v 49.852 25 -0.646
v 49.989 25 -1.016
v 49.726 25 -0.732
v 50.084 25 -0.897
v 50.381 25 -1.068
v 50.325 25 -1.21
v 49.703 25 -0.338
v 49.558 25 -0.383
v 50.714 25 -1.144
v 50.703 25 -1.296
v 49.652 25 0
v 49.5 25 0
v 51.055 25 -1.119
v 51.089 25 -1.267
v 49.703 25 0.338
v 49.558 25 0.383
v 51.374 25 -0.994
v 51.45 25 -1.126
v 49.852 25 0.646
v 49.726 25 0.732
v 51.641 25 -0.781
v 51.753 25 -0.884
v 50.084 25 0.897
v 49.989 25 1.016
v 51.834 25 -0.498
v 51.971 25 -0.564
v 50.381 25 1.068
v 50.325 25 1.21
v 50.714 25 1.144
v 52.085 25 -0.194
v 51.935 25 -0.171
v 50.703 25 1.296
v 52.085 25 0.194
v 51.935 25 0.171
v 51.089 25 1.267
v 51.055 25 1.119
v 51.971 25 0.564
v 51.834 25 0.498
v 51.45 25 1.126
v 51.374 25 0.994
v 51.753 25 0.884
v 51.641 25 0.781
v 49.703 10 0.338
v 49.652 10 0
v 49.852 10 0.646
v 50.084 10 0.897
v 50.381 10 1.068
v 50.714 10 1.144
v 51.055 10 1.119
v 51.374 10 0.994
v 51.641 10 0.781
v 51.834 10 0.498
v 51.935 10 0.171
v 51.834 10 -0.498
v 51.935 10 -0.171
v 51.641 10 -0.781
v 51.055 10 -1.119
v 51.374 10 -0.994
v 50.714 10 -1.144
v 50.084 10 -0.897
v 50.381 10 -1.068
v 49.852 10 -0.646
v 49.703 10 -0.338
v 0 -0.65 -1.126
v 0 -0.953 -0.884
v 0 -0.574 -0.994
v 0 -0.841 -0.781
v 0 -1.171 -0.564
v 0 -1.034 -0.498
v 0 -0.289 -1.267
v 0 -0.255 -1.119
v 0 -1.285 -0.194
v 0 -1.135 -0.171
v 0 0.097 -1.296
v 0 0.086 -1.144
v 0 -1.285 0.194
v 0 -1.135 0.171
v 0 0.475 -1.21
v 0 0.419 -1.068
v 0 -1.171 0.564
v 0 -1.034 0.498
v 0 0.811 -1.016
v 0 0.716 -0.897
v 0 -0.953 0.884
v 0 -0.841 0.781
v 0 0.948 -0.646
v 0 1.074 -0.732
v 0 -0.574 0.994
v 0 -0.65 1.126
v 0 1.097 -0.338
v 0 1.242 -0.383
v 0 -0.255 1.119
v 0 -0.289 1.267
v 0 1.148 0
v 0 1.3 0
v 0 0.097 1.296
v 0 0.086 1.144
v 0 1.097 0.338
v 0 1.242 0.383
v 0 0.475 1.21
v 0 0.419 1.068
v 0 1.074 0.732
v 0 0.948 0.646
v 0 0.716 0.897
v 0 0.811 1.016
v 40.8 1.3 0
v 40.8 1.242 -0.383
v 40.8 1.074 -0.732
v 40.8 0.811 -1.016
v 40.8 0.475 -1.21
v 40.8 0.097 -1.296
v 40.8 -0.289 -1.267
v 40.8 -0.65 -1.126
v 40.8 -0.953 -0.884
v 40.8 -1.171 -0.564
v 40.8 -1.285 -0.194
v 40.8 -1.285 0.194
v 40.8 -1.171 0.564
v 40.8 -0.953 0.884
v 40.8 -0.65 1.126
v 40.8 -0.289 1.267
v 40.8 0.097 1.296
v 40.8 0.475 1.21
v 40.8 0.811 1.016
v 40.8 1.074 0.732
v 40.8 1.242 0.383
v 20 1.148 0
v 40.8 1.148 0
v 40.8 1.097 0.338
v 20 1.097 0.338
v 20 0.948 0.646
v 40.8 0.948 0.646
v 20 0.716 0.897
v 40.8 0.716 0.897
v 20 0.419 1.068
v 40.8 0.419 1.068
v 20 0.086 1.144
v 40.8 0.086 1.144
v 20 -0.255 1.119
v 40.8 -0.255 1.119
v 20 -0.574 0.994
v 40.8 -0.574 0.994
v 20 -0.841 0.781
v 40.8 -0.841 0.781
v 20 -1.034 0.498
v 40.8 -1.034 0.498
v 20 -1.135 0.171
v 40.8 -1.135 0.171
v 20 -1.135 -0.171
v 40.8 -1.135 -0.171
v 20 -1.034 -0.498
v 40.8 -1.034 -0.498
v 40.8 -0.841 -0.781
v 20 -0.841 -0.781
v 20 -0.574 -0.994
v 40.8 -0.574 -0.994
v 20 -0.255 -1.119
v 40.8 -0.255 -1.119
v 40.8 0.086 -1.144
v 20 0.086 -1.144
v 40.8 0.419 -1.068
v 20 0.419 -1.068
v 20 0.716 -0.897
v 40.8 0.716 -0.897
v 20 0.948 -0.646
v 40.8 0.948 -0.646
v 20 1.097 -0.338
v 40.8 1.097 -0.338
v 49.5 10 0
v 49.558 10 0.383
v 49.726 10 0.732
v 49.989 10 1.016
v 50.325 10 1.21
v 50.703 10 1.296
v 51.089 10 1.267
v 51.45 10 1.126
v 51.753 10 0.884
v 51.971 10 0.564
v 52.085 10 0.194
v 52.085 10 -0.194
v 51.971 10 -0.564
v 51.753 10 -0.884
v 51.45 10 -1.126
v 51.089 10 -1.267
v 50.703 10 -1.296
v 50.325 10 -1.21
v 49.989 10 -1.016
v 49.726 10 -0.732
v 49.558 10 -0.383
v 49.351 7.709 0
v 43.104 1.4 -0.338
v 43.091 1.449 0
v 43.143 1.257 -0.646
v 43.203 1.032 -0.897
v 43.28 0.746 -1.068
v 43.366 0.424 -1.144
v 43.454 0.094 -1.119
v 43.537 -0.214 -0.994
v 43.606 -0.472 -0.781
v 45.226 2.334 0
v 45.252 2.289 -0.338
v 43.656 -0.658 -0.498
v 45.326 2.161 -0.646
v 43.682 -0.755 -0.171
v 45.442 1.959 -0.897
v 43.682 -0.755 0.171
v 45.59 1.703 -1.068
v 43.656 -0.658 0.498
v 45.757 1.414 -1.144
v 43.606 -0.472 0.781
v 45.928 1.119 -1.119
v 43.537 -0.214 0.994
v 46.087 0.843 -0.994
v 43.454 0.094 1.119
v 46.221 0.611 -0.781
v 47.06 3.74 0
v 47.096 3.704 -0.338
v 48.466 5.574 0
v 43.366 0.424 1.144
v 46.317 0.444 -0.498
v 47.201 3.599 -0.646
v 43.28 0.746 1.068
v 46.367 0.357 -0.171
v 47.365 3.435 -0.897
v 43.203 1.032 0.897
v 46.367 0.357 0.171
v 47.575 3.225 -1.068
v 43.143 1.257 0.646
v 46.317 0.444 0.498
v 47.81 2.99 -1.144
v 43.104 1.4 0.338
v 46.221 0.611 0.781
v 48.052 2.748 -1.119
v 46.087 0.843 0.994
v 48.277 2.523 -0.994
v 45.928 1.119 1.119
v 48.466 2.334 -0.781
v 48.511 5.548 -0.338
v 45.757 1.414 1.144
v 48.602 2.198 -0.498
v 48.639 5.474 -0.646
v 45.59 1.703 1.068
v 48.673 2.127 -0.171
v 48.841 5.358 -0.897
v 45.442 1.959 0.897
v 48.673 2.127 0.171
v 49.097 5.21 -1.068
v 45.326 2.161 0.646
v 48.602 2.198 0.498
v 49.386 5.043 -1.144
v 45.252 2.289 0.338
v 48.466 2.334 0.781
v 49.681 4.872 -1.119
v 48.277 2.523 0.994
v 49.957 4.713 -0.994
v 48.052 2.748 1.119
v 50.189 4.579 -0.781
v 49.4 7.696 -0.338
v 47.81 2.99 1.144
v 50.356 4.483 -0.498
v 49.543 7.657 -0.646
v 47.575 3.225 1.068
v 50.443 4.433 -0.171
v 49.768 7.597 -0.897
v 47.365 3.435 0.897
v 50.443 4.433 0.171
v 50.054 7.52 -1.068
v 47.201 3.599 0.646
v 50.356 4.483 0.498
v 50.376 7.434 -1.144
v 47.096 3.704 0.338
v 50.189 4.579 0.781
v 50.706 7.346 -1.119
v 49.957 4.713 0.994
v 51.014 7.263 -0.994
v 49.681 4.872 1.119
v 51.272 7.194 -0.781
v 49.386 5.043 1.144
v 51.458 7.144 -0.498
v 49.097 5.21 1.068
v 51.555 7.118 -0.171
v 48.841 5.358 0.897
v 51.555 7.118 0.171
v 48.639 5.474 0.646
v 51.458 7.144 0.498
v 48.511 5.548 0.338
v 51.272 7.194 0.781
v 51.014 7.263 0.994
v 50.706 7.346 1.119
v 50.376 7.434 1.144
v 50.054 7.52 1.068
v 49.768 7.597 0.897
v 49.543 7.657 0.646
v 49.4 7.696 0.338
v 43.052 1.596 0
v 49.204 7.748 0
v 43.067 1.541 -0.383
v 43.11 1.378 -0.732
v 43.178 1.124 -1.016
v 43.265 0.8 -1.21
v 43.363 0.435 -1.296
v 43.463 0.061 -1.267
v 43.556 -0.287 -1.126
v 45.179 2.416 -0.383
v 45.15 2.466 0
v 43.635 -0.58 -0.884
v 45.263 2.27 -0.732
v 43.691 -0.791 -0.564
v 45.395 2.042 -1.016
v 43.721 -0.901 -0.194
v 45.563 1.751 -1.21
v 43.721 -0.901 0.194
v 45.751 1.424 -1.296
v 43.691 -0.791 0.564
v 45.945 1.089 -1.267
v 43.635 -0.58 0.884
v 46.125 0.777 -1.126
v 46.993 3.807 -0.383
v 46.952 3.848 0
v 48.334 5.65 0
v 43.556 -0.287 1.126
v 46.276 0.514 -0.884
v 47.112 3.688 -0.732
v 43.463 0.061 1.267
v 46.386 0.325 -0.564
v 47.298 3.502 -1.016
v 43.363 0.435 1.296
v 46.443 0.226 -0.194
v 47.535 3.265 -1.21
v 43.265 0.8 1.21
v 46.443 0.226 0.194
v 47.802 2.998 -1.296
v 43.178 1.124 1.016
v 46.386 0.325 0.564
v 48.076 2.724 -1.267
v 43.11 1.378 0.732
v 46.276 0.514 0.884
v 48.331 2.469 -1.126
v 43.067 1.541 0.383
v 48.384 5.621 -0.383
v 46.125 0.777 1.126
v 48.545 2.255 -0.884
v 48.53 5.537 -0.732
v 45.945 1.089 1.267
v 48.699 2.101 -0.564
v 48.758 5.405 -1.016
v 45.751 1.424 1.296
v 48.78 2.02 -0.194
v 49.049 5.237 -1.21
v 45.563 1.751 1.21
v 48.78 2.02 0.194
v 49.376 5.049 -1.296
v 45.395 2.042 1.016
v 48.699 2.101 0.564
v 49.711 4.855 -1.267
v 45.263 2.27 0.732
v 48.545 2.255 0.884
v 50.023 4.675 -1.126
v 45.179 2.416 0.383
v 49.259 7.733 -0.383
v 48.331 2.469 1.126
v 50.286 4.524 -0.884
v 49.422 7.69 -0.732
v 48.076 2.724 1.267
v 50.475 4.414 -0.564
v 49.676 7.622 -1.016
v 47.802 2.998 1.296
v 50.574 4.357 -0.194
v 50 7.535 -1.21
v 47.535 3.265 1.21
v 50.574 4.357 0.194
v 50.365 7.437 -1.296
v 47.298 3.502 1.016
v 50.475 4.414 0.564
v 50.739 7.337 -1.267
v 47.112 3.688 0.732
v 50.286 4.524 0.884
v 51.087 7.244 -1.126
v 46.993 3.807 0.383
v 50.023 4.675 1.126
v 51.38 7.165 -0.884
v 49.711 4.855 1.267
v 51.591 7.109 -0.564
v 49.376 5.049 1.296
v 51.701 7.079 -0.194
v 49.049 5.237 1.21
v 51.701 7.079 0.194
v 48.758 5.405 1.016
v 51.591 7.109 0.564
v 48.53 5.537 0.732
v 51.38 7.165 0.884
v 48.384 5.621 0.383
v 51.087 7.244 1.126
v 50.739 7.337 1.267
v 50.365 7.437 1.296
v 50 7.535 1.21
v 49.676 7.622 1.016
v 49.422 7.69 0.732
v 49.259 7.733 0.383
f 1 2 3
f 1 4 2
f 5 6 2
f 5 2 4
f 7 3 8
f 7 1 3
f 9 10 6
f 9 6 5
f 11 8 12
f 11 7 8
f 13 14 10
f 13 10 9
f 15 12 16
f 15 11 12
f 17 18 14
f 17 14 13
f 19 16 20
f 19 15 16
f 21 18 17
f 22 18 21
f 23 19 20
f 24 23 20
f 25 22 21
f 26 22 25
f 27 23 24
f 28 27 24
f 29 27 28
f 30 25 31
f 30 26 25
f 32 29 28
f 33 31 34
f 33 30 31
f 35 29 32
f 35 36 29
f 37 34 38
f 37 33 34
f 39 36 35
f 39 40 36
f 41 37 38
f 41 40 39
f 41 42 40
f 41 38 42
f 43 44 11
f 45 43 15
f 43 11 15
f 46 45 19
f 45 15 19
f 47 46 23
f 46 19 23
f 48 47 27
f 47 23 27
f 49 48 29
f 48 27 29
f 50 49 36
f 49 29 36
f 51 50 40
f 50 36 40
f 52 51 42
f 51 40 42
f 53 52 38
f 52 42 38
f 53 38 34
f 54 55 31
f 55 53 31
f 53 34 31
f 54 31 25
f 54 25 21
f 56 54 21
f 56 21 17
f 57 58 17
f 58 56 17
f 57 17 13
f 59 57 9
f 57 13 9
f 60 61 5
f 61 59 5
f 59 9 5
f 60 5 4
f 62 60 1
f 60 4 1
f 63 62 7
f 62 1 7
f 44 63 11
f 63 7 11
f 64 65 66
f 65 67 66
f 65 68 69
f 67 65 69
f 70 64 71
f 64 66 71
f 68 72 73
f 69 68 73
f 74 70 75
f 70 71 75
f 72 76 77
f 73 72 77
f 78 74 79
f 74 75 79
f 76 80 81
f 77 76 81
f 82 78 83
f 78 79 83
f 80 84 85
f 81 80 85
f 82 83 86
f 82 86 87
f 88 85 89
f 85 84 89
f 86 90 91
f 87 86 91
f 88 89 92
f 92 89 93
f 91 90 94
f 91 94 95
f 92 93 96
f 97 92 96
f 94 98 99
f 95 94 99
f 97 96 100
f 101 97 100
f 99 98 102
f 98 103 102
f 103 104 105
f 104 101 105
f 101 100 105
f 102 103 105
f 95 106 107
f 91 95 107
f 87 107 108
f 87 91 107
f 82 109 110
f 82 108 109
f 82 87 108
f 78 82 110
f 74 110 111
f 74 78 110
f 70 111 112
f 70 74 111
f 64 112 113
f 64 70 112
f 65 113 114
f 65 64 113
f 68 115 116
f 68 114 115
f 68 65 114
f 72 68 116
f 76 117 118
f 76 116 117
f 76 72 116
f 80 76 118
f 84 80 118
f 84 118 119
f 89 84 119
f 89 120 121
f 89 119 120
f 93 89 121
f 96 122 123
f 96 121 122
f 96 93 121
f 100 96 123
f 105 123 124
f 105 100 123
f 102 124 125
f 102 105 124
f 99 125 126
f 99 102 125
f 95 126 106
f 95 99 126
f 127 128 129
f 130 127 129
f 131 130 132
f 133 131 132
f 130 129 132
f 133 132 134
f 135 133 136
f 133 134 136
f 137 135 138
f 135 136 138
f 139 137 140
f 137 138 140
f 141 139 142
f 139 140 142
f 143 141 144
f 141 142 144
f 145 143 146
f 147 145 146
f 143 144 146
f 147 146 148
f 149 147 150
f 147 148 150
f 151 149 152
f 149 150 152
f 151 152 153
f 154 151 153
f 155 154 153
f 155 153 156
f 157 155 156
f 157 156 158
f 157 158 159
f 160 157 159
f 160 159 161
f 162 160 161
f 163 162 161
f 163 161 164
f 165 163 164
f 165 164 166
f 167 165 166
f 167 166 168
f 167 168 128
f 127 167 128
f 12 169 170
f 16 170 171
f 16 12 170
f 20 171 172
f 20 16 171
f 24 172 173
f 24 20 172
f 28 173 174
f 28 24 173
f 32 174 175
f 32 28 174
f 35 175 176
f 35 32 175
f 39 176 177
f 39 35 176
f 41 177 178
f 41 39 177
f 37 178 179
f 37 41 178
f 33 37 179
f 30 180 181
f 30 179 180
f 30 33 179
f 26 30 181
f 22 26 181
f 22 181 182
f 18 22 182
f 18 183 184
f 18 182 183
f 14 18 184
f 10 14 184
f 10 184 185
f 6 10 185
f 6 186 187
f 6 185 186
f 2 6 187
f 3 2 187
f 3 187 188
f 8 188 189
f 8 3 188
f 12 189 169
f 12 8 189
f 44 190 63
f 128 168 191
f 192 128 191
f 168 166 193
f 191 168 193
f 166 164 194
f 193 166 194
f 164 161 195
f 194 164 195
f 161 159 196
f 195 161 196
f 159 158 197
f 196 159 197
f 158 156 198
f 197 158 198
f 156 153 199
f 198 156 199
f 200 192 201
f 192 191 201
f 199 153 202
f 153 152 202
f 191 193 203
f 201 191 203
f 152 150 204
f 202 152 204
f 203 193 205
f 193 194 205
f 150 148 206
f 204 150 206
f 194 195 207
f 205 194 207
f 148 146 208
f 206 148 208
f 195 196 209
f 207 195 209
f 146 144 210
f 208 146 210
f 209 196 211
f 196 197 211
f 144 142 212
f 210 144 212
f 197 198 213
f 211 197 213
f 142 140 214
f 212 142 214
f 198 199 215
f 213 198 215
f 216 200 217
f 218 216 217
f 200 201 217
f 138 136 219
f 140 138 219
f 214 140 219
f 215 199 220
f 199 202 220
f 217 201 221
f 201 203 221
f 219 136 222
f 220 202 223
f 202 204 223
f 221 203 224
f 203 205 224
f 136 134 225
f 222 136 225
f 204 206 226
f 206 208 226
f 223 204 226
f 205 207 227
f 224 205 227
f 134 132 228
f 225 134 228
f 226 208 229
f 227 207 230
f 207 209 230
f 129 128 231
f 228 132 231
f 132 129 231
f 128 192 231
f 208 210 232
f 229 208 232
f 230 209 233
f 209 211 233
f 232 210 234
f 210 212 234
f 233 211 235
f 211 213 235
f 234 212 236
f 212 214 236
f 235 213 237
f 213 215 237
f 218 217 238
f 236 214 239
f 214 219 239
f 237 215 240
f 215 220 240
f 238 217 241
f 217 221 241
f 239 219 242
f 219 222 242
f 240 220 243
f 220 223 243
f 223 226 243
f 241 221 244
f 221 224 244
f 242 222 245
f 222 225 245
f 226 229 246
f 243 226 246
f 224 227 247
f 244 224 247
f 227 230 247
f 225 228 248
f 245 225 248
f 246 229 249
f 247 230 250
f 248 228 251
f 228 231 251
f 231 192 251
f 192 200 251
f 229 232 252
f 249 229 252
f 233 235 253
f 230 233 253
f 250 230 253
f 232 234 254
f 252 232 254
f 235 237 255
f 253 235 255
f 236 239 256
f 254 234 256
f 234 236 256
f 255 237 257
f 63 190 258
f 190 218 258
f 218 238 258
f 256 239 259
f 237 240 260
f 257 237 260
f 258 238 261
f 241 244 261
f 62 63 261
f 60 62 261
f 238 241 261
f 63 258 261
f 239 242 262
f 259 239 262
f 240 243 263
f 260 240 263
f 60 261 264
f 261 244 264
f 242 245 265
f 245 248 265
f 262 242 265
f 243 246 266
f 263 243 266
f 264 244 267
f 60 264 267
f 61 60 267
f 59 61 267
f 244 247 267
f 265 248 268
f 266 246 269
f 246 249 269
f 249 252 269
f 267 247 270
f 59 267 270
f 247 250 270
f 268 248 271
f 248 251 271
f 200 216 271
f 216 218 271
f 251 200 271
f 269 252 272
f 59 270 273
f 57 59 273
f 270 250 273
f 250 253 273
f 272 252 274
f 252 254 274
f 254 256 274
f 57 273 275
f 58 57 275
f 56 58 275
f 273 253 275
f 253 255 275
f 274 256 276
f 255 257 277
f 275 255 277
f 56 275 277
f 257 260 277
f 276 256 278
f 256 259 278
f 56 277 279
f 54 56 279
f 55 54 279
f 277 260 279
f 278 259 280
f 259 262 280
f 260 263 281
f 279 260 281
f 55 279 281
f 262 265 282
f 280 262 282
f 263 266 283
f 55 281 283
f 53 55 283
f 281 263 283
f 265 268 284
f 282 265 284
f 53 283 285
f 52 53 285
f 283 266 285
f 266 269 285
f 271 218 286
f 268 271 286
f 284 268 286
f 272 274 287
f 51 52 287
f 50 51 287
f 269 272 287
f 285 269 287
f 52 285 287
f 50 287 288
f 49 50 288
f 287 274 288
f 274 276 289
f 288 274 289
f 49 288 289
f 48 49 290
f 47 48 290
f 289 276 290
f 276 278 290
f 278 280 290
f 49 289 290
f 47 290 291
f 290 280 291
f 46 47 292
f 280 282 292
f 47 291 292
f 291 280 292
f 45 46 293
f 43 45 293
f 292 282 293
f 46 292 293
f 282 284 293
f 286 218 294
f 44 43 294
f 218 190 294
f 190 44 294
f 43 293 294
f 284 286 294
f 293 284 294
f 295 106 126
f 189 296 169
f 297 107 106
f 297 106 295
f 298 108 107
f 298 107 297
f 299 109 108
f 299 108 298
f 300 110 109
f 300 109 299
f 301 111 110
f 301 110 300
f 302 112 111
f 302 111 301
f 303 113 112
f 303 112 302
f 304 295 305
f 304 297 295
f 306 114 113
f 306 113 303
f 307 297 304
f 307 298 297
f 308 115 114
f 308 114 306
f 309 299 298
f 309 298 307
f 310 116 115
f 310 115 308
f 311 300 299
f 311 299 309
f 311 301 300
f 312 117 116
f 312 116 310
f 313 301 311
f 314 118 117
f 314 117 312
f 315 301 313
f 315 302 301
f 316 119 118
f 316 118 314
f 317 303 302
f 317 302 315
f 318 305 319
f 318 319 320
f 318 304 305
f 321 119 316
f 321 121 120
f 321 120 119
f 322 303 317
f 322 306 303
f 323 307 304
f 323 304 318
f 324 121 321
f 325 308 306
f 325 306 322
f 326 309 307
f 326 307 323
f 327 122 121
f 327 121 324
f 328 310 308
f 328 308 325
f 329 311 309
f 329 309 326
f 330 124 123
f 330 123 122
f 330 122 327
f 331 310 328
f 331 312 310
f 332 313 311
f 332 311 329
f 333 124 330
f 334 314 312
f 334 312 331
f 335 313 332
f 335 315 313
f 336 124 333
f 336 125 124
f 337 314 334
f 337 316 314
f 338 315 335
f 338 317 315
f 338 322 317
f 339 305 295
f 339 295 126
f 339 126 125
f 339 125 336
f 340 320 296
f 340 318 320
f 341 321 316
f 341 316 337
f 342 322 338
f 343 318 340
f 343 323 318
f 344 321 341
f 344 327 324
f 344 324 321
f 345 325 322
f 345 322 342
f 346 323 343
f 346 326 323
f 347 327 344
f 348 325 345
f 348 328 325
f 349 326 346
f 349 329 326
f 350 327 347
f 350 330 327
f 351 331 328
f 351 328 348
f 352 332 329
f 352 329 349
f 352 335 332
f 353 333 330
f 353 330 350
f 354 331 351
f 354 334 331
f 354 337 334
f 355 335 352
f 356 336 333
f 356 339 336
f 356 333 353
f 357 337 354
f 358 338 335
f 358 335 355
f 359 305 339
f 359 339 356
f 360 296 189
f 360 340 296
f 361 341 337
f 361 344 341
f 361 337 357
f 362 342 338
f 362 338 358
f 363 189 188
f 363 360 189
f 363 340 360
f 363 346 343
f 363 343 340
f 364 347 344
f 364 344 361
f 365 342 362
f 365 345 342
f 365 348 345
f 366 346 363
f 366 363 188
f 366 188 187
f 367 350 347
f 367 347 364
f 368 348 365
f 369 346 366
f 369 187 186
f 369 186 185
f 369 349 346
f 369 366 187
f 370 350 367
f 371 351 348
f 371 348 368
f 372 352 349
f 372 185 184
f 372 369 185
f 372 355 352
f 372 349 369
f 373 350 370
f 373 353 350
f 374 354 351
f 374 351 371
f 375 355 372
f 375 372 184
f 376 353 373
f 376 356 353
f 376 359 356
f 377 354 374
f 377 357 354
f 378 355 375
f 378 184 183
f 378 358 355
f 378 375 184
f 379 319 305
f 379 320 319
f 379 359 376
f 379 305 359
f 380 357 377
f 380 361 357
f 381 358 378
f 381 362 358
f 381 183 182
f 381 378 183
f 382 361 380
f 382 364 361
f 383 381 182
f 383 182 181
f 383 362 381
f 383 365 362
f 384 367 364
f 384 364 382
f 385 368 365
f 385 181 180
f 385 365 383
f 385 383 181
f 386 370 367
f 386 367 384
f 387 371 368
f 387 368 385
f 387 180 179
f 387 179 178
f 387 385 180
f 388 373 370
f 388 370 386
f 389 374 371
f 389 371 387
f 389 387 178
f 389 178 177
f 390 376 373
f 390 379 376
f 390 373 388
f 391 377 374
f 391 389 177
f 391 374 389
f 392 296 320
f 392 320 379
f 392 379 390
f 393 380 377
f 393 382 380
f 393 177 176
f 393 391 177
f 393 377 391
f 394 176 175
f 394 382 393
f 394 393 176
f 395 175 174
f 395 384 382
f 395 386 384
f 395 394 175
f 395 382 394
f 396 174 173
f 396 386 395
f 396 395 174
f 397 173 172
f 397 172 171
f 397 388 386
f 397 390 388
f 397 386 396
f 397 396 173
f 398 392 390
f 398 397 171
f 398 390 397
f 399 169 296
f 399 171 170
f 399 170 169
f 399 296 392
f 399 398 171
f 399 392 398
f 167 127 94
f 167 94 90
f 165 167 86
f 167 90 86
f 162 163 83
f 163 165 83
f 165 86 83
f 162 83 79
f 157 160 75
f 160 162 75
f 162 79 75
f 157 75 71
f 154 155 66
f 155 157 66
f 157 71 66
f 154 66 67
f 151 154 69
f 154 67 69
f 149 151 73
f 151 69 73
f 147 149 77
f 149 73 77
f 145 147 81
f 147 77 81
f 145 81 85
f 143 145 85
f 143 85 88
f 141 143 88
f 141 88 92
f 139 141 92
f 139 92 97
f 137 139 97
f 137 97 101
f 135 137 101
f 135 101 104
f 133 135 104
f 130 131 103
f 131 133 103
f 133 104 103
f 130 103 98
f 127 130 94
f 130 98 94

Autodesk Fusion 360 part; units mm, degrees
sketch "Sketch1" plane through (0, 0, 0) normal (1, 0, 0) x (0, 1, 0)
  circle A0 centre (0, 0) radius 1.3
  circle A1 centre (0, 0) radius 1.1476
  dimension "d1" = 2.6
  dimension "d2" = 2.2952
extrude "Extrude1" add sketch "Sketch1" along normal blind 20
equation "d2 = d1 - 0.012 in"

Autodesk Fusion 360 part; units mm, degrees
sketch "Sketch1" plane through (0, 0, 0) normal (1, 0, 0) x (0, 1, 0)
  circle A0 centre (0, 0) radius 1.3
  circle A1 centre (0, 0) radius 1.1476
  dimension "d1" = 2.6
  dimension "d2" = 2.2952
extrude "Extrude1" add sketch "Sketch1" along normal blind 7
equation "d2 = d1 - 0.012 in"

Autodesk Fusion 360 part; units mm, degrees
sketch "Sketch1" plane through (0, 0, 0) normal (1, 0, 0) x (0, 1, 0)
  circle A0 centre (0, 0) radius 1.3
  circle A1 centre (0, 0) radius 1.1476
  dimension "d1" = 2.6
  dimension "d2" = 2.2952
sketch "Sketch2" plane through (0, 0, 0) normal (0, 0, 1) x (1, 0, 0)
  line L0 (0, 0) -> (40.8, 0)
  line L1 (50.8, 10) -> (50.8, 25)
  arc A0 (40.8, 0) -> (50.8, 10) centre (40.8, 10) ccw
  point P0 (50.8, 0)
  dimension "d3" = 50.8
  dimension "d4" = 25
  dimension "d5" = 10
sweep "Sweep1" add profiles "Sketch1" path "Sketch2" along L0 A0 L1 section 1
equation "d2 = d1 - 0.012 in"
